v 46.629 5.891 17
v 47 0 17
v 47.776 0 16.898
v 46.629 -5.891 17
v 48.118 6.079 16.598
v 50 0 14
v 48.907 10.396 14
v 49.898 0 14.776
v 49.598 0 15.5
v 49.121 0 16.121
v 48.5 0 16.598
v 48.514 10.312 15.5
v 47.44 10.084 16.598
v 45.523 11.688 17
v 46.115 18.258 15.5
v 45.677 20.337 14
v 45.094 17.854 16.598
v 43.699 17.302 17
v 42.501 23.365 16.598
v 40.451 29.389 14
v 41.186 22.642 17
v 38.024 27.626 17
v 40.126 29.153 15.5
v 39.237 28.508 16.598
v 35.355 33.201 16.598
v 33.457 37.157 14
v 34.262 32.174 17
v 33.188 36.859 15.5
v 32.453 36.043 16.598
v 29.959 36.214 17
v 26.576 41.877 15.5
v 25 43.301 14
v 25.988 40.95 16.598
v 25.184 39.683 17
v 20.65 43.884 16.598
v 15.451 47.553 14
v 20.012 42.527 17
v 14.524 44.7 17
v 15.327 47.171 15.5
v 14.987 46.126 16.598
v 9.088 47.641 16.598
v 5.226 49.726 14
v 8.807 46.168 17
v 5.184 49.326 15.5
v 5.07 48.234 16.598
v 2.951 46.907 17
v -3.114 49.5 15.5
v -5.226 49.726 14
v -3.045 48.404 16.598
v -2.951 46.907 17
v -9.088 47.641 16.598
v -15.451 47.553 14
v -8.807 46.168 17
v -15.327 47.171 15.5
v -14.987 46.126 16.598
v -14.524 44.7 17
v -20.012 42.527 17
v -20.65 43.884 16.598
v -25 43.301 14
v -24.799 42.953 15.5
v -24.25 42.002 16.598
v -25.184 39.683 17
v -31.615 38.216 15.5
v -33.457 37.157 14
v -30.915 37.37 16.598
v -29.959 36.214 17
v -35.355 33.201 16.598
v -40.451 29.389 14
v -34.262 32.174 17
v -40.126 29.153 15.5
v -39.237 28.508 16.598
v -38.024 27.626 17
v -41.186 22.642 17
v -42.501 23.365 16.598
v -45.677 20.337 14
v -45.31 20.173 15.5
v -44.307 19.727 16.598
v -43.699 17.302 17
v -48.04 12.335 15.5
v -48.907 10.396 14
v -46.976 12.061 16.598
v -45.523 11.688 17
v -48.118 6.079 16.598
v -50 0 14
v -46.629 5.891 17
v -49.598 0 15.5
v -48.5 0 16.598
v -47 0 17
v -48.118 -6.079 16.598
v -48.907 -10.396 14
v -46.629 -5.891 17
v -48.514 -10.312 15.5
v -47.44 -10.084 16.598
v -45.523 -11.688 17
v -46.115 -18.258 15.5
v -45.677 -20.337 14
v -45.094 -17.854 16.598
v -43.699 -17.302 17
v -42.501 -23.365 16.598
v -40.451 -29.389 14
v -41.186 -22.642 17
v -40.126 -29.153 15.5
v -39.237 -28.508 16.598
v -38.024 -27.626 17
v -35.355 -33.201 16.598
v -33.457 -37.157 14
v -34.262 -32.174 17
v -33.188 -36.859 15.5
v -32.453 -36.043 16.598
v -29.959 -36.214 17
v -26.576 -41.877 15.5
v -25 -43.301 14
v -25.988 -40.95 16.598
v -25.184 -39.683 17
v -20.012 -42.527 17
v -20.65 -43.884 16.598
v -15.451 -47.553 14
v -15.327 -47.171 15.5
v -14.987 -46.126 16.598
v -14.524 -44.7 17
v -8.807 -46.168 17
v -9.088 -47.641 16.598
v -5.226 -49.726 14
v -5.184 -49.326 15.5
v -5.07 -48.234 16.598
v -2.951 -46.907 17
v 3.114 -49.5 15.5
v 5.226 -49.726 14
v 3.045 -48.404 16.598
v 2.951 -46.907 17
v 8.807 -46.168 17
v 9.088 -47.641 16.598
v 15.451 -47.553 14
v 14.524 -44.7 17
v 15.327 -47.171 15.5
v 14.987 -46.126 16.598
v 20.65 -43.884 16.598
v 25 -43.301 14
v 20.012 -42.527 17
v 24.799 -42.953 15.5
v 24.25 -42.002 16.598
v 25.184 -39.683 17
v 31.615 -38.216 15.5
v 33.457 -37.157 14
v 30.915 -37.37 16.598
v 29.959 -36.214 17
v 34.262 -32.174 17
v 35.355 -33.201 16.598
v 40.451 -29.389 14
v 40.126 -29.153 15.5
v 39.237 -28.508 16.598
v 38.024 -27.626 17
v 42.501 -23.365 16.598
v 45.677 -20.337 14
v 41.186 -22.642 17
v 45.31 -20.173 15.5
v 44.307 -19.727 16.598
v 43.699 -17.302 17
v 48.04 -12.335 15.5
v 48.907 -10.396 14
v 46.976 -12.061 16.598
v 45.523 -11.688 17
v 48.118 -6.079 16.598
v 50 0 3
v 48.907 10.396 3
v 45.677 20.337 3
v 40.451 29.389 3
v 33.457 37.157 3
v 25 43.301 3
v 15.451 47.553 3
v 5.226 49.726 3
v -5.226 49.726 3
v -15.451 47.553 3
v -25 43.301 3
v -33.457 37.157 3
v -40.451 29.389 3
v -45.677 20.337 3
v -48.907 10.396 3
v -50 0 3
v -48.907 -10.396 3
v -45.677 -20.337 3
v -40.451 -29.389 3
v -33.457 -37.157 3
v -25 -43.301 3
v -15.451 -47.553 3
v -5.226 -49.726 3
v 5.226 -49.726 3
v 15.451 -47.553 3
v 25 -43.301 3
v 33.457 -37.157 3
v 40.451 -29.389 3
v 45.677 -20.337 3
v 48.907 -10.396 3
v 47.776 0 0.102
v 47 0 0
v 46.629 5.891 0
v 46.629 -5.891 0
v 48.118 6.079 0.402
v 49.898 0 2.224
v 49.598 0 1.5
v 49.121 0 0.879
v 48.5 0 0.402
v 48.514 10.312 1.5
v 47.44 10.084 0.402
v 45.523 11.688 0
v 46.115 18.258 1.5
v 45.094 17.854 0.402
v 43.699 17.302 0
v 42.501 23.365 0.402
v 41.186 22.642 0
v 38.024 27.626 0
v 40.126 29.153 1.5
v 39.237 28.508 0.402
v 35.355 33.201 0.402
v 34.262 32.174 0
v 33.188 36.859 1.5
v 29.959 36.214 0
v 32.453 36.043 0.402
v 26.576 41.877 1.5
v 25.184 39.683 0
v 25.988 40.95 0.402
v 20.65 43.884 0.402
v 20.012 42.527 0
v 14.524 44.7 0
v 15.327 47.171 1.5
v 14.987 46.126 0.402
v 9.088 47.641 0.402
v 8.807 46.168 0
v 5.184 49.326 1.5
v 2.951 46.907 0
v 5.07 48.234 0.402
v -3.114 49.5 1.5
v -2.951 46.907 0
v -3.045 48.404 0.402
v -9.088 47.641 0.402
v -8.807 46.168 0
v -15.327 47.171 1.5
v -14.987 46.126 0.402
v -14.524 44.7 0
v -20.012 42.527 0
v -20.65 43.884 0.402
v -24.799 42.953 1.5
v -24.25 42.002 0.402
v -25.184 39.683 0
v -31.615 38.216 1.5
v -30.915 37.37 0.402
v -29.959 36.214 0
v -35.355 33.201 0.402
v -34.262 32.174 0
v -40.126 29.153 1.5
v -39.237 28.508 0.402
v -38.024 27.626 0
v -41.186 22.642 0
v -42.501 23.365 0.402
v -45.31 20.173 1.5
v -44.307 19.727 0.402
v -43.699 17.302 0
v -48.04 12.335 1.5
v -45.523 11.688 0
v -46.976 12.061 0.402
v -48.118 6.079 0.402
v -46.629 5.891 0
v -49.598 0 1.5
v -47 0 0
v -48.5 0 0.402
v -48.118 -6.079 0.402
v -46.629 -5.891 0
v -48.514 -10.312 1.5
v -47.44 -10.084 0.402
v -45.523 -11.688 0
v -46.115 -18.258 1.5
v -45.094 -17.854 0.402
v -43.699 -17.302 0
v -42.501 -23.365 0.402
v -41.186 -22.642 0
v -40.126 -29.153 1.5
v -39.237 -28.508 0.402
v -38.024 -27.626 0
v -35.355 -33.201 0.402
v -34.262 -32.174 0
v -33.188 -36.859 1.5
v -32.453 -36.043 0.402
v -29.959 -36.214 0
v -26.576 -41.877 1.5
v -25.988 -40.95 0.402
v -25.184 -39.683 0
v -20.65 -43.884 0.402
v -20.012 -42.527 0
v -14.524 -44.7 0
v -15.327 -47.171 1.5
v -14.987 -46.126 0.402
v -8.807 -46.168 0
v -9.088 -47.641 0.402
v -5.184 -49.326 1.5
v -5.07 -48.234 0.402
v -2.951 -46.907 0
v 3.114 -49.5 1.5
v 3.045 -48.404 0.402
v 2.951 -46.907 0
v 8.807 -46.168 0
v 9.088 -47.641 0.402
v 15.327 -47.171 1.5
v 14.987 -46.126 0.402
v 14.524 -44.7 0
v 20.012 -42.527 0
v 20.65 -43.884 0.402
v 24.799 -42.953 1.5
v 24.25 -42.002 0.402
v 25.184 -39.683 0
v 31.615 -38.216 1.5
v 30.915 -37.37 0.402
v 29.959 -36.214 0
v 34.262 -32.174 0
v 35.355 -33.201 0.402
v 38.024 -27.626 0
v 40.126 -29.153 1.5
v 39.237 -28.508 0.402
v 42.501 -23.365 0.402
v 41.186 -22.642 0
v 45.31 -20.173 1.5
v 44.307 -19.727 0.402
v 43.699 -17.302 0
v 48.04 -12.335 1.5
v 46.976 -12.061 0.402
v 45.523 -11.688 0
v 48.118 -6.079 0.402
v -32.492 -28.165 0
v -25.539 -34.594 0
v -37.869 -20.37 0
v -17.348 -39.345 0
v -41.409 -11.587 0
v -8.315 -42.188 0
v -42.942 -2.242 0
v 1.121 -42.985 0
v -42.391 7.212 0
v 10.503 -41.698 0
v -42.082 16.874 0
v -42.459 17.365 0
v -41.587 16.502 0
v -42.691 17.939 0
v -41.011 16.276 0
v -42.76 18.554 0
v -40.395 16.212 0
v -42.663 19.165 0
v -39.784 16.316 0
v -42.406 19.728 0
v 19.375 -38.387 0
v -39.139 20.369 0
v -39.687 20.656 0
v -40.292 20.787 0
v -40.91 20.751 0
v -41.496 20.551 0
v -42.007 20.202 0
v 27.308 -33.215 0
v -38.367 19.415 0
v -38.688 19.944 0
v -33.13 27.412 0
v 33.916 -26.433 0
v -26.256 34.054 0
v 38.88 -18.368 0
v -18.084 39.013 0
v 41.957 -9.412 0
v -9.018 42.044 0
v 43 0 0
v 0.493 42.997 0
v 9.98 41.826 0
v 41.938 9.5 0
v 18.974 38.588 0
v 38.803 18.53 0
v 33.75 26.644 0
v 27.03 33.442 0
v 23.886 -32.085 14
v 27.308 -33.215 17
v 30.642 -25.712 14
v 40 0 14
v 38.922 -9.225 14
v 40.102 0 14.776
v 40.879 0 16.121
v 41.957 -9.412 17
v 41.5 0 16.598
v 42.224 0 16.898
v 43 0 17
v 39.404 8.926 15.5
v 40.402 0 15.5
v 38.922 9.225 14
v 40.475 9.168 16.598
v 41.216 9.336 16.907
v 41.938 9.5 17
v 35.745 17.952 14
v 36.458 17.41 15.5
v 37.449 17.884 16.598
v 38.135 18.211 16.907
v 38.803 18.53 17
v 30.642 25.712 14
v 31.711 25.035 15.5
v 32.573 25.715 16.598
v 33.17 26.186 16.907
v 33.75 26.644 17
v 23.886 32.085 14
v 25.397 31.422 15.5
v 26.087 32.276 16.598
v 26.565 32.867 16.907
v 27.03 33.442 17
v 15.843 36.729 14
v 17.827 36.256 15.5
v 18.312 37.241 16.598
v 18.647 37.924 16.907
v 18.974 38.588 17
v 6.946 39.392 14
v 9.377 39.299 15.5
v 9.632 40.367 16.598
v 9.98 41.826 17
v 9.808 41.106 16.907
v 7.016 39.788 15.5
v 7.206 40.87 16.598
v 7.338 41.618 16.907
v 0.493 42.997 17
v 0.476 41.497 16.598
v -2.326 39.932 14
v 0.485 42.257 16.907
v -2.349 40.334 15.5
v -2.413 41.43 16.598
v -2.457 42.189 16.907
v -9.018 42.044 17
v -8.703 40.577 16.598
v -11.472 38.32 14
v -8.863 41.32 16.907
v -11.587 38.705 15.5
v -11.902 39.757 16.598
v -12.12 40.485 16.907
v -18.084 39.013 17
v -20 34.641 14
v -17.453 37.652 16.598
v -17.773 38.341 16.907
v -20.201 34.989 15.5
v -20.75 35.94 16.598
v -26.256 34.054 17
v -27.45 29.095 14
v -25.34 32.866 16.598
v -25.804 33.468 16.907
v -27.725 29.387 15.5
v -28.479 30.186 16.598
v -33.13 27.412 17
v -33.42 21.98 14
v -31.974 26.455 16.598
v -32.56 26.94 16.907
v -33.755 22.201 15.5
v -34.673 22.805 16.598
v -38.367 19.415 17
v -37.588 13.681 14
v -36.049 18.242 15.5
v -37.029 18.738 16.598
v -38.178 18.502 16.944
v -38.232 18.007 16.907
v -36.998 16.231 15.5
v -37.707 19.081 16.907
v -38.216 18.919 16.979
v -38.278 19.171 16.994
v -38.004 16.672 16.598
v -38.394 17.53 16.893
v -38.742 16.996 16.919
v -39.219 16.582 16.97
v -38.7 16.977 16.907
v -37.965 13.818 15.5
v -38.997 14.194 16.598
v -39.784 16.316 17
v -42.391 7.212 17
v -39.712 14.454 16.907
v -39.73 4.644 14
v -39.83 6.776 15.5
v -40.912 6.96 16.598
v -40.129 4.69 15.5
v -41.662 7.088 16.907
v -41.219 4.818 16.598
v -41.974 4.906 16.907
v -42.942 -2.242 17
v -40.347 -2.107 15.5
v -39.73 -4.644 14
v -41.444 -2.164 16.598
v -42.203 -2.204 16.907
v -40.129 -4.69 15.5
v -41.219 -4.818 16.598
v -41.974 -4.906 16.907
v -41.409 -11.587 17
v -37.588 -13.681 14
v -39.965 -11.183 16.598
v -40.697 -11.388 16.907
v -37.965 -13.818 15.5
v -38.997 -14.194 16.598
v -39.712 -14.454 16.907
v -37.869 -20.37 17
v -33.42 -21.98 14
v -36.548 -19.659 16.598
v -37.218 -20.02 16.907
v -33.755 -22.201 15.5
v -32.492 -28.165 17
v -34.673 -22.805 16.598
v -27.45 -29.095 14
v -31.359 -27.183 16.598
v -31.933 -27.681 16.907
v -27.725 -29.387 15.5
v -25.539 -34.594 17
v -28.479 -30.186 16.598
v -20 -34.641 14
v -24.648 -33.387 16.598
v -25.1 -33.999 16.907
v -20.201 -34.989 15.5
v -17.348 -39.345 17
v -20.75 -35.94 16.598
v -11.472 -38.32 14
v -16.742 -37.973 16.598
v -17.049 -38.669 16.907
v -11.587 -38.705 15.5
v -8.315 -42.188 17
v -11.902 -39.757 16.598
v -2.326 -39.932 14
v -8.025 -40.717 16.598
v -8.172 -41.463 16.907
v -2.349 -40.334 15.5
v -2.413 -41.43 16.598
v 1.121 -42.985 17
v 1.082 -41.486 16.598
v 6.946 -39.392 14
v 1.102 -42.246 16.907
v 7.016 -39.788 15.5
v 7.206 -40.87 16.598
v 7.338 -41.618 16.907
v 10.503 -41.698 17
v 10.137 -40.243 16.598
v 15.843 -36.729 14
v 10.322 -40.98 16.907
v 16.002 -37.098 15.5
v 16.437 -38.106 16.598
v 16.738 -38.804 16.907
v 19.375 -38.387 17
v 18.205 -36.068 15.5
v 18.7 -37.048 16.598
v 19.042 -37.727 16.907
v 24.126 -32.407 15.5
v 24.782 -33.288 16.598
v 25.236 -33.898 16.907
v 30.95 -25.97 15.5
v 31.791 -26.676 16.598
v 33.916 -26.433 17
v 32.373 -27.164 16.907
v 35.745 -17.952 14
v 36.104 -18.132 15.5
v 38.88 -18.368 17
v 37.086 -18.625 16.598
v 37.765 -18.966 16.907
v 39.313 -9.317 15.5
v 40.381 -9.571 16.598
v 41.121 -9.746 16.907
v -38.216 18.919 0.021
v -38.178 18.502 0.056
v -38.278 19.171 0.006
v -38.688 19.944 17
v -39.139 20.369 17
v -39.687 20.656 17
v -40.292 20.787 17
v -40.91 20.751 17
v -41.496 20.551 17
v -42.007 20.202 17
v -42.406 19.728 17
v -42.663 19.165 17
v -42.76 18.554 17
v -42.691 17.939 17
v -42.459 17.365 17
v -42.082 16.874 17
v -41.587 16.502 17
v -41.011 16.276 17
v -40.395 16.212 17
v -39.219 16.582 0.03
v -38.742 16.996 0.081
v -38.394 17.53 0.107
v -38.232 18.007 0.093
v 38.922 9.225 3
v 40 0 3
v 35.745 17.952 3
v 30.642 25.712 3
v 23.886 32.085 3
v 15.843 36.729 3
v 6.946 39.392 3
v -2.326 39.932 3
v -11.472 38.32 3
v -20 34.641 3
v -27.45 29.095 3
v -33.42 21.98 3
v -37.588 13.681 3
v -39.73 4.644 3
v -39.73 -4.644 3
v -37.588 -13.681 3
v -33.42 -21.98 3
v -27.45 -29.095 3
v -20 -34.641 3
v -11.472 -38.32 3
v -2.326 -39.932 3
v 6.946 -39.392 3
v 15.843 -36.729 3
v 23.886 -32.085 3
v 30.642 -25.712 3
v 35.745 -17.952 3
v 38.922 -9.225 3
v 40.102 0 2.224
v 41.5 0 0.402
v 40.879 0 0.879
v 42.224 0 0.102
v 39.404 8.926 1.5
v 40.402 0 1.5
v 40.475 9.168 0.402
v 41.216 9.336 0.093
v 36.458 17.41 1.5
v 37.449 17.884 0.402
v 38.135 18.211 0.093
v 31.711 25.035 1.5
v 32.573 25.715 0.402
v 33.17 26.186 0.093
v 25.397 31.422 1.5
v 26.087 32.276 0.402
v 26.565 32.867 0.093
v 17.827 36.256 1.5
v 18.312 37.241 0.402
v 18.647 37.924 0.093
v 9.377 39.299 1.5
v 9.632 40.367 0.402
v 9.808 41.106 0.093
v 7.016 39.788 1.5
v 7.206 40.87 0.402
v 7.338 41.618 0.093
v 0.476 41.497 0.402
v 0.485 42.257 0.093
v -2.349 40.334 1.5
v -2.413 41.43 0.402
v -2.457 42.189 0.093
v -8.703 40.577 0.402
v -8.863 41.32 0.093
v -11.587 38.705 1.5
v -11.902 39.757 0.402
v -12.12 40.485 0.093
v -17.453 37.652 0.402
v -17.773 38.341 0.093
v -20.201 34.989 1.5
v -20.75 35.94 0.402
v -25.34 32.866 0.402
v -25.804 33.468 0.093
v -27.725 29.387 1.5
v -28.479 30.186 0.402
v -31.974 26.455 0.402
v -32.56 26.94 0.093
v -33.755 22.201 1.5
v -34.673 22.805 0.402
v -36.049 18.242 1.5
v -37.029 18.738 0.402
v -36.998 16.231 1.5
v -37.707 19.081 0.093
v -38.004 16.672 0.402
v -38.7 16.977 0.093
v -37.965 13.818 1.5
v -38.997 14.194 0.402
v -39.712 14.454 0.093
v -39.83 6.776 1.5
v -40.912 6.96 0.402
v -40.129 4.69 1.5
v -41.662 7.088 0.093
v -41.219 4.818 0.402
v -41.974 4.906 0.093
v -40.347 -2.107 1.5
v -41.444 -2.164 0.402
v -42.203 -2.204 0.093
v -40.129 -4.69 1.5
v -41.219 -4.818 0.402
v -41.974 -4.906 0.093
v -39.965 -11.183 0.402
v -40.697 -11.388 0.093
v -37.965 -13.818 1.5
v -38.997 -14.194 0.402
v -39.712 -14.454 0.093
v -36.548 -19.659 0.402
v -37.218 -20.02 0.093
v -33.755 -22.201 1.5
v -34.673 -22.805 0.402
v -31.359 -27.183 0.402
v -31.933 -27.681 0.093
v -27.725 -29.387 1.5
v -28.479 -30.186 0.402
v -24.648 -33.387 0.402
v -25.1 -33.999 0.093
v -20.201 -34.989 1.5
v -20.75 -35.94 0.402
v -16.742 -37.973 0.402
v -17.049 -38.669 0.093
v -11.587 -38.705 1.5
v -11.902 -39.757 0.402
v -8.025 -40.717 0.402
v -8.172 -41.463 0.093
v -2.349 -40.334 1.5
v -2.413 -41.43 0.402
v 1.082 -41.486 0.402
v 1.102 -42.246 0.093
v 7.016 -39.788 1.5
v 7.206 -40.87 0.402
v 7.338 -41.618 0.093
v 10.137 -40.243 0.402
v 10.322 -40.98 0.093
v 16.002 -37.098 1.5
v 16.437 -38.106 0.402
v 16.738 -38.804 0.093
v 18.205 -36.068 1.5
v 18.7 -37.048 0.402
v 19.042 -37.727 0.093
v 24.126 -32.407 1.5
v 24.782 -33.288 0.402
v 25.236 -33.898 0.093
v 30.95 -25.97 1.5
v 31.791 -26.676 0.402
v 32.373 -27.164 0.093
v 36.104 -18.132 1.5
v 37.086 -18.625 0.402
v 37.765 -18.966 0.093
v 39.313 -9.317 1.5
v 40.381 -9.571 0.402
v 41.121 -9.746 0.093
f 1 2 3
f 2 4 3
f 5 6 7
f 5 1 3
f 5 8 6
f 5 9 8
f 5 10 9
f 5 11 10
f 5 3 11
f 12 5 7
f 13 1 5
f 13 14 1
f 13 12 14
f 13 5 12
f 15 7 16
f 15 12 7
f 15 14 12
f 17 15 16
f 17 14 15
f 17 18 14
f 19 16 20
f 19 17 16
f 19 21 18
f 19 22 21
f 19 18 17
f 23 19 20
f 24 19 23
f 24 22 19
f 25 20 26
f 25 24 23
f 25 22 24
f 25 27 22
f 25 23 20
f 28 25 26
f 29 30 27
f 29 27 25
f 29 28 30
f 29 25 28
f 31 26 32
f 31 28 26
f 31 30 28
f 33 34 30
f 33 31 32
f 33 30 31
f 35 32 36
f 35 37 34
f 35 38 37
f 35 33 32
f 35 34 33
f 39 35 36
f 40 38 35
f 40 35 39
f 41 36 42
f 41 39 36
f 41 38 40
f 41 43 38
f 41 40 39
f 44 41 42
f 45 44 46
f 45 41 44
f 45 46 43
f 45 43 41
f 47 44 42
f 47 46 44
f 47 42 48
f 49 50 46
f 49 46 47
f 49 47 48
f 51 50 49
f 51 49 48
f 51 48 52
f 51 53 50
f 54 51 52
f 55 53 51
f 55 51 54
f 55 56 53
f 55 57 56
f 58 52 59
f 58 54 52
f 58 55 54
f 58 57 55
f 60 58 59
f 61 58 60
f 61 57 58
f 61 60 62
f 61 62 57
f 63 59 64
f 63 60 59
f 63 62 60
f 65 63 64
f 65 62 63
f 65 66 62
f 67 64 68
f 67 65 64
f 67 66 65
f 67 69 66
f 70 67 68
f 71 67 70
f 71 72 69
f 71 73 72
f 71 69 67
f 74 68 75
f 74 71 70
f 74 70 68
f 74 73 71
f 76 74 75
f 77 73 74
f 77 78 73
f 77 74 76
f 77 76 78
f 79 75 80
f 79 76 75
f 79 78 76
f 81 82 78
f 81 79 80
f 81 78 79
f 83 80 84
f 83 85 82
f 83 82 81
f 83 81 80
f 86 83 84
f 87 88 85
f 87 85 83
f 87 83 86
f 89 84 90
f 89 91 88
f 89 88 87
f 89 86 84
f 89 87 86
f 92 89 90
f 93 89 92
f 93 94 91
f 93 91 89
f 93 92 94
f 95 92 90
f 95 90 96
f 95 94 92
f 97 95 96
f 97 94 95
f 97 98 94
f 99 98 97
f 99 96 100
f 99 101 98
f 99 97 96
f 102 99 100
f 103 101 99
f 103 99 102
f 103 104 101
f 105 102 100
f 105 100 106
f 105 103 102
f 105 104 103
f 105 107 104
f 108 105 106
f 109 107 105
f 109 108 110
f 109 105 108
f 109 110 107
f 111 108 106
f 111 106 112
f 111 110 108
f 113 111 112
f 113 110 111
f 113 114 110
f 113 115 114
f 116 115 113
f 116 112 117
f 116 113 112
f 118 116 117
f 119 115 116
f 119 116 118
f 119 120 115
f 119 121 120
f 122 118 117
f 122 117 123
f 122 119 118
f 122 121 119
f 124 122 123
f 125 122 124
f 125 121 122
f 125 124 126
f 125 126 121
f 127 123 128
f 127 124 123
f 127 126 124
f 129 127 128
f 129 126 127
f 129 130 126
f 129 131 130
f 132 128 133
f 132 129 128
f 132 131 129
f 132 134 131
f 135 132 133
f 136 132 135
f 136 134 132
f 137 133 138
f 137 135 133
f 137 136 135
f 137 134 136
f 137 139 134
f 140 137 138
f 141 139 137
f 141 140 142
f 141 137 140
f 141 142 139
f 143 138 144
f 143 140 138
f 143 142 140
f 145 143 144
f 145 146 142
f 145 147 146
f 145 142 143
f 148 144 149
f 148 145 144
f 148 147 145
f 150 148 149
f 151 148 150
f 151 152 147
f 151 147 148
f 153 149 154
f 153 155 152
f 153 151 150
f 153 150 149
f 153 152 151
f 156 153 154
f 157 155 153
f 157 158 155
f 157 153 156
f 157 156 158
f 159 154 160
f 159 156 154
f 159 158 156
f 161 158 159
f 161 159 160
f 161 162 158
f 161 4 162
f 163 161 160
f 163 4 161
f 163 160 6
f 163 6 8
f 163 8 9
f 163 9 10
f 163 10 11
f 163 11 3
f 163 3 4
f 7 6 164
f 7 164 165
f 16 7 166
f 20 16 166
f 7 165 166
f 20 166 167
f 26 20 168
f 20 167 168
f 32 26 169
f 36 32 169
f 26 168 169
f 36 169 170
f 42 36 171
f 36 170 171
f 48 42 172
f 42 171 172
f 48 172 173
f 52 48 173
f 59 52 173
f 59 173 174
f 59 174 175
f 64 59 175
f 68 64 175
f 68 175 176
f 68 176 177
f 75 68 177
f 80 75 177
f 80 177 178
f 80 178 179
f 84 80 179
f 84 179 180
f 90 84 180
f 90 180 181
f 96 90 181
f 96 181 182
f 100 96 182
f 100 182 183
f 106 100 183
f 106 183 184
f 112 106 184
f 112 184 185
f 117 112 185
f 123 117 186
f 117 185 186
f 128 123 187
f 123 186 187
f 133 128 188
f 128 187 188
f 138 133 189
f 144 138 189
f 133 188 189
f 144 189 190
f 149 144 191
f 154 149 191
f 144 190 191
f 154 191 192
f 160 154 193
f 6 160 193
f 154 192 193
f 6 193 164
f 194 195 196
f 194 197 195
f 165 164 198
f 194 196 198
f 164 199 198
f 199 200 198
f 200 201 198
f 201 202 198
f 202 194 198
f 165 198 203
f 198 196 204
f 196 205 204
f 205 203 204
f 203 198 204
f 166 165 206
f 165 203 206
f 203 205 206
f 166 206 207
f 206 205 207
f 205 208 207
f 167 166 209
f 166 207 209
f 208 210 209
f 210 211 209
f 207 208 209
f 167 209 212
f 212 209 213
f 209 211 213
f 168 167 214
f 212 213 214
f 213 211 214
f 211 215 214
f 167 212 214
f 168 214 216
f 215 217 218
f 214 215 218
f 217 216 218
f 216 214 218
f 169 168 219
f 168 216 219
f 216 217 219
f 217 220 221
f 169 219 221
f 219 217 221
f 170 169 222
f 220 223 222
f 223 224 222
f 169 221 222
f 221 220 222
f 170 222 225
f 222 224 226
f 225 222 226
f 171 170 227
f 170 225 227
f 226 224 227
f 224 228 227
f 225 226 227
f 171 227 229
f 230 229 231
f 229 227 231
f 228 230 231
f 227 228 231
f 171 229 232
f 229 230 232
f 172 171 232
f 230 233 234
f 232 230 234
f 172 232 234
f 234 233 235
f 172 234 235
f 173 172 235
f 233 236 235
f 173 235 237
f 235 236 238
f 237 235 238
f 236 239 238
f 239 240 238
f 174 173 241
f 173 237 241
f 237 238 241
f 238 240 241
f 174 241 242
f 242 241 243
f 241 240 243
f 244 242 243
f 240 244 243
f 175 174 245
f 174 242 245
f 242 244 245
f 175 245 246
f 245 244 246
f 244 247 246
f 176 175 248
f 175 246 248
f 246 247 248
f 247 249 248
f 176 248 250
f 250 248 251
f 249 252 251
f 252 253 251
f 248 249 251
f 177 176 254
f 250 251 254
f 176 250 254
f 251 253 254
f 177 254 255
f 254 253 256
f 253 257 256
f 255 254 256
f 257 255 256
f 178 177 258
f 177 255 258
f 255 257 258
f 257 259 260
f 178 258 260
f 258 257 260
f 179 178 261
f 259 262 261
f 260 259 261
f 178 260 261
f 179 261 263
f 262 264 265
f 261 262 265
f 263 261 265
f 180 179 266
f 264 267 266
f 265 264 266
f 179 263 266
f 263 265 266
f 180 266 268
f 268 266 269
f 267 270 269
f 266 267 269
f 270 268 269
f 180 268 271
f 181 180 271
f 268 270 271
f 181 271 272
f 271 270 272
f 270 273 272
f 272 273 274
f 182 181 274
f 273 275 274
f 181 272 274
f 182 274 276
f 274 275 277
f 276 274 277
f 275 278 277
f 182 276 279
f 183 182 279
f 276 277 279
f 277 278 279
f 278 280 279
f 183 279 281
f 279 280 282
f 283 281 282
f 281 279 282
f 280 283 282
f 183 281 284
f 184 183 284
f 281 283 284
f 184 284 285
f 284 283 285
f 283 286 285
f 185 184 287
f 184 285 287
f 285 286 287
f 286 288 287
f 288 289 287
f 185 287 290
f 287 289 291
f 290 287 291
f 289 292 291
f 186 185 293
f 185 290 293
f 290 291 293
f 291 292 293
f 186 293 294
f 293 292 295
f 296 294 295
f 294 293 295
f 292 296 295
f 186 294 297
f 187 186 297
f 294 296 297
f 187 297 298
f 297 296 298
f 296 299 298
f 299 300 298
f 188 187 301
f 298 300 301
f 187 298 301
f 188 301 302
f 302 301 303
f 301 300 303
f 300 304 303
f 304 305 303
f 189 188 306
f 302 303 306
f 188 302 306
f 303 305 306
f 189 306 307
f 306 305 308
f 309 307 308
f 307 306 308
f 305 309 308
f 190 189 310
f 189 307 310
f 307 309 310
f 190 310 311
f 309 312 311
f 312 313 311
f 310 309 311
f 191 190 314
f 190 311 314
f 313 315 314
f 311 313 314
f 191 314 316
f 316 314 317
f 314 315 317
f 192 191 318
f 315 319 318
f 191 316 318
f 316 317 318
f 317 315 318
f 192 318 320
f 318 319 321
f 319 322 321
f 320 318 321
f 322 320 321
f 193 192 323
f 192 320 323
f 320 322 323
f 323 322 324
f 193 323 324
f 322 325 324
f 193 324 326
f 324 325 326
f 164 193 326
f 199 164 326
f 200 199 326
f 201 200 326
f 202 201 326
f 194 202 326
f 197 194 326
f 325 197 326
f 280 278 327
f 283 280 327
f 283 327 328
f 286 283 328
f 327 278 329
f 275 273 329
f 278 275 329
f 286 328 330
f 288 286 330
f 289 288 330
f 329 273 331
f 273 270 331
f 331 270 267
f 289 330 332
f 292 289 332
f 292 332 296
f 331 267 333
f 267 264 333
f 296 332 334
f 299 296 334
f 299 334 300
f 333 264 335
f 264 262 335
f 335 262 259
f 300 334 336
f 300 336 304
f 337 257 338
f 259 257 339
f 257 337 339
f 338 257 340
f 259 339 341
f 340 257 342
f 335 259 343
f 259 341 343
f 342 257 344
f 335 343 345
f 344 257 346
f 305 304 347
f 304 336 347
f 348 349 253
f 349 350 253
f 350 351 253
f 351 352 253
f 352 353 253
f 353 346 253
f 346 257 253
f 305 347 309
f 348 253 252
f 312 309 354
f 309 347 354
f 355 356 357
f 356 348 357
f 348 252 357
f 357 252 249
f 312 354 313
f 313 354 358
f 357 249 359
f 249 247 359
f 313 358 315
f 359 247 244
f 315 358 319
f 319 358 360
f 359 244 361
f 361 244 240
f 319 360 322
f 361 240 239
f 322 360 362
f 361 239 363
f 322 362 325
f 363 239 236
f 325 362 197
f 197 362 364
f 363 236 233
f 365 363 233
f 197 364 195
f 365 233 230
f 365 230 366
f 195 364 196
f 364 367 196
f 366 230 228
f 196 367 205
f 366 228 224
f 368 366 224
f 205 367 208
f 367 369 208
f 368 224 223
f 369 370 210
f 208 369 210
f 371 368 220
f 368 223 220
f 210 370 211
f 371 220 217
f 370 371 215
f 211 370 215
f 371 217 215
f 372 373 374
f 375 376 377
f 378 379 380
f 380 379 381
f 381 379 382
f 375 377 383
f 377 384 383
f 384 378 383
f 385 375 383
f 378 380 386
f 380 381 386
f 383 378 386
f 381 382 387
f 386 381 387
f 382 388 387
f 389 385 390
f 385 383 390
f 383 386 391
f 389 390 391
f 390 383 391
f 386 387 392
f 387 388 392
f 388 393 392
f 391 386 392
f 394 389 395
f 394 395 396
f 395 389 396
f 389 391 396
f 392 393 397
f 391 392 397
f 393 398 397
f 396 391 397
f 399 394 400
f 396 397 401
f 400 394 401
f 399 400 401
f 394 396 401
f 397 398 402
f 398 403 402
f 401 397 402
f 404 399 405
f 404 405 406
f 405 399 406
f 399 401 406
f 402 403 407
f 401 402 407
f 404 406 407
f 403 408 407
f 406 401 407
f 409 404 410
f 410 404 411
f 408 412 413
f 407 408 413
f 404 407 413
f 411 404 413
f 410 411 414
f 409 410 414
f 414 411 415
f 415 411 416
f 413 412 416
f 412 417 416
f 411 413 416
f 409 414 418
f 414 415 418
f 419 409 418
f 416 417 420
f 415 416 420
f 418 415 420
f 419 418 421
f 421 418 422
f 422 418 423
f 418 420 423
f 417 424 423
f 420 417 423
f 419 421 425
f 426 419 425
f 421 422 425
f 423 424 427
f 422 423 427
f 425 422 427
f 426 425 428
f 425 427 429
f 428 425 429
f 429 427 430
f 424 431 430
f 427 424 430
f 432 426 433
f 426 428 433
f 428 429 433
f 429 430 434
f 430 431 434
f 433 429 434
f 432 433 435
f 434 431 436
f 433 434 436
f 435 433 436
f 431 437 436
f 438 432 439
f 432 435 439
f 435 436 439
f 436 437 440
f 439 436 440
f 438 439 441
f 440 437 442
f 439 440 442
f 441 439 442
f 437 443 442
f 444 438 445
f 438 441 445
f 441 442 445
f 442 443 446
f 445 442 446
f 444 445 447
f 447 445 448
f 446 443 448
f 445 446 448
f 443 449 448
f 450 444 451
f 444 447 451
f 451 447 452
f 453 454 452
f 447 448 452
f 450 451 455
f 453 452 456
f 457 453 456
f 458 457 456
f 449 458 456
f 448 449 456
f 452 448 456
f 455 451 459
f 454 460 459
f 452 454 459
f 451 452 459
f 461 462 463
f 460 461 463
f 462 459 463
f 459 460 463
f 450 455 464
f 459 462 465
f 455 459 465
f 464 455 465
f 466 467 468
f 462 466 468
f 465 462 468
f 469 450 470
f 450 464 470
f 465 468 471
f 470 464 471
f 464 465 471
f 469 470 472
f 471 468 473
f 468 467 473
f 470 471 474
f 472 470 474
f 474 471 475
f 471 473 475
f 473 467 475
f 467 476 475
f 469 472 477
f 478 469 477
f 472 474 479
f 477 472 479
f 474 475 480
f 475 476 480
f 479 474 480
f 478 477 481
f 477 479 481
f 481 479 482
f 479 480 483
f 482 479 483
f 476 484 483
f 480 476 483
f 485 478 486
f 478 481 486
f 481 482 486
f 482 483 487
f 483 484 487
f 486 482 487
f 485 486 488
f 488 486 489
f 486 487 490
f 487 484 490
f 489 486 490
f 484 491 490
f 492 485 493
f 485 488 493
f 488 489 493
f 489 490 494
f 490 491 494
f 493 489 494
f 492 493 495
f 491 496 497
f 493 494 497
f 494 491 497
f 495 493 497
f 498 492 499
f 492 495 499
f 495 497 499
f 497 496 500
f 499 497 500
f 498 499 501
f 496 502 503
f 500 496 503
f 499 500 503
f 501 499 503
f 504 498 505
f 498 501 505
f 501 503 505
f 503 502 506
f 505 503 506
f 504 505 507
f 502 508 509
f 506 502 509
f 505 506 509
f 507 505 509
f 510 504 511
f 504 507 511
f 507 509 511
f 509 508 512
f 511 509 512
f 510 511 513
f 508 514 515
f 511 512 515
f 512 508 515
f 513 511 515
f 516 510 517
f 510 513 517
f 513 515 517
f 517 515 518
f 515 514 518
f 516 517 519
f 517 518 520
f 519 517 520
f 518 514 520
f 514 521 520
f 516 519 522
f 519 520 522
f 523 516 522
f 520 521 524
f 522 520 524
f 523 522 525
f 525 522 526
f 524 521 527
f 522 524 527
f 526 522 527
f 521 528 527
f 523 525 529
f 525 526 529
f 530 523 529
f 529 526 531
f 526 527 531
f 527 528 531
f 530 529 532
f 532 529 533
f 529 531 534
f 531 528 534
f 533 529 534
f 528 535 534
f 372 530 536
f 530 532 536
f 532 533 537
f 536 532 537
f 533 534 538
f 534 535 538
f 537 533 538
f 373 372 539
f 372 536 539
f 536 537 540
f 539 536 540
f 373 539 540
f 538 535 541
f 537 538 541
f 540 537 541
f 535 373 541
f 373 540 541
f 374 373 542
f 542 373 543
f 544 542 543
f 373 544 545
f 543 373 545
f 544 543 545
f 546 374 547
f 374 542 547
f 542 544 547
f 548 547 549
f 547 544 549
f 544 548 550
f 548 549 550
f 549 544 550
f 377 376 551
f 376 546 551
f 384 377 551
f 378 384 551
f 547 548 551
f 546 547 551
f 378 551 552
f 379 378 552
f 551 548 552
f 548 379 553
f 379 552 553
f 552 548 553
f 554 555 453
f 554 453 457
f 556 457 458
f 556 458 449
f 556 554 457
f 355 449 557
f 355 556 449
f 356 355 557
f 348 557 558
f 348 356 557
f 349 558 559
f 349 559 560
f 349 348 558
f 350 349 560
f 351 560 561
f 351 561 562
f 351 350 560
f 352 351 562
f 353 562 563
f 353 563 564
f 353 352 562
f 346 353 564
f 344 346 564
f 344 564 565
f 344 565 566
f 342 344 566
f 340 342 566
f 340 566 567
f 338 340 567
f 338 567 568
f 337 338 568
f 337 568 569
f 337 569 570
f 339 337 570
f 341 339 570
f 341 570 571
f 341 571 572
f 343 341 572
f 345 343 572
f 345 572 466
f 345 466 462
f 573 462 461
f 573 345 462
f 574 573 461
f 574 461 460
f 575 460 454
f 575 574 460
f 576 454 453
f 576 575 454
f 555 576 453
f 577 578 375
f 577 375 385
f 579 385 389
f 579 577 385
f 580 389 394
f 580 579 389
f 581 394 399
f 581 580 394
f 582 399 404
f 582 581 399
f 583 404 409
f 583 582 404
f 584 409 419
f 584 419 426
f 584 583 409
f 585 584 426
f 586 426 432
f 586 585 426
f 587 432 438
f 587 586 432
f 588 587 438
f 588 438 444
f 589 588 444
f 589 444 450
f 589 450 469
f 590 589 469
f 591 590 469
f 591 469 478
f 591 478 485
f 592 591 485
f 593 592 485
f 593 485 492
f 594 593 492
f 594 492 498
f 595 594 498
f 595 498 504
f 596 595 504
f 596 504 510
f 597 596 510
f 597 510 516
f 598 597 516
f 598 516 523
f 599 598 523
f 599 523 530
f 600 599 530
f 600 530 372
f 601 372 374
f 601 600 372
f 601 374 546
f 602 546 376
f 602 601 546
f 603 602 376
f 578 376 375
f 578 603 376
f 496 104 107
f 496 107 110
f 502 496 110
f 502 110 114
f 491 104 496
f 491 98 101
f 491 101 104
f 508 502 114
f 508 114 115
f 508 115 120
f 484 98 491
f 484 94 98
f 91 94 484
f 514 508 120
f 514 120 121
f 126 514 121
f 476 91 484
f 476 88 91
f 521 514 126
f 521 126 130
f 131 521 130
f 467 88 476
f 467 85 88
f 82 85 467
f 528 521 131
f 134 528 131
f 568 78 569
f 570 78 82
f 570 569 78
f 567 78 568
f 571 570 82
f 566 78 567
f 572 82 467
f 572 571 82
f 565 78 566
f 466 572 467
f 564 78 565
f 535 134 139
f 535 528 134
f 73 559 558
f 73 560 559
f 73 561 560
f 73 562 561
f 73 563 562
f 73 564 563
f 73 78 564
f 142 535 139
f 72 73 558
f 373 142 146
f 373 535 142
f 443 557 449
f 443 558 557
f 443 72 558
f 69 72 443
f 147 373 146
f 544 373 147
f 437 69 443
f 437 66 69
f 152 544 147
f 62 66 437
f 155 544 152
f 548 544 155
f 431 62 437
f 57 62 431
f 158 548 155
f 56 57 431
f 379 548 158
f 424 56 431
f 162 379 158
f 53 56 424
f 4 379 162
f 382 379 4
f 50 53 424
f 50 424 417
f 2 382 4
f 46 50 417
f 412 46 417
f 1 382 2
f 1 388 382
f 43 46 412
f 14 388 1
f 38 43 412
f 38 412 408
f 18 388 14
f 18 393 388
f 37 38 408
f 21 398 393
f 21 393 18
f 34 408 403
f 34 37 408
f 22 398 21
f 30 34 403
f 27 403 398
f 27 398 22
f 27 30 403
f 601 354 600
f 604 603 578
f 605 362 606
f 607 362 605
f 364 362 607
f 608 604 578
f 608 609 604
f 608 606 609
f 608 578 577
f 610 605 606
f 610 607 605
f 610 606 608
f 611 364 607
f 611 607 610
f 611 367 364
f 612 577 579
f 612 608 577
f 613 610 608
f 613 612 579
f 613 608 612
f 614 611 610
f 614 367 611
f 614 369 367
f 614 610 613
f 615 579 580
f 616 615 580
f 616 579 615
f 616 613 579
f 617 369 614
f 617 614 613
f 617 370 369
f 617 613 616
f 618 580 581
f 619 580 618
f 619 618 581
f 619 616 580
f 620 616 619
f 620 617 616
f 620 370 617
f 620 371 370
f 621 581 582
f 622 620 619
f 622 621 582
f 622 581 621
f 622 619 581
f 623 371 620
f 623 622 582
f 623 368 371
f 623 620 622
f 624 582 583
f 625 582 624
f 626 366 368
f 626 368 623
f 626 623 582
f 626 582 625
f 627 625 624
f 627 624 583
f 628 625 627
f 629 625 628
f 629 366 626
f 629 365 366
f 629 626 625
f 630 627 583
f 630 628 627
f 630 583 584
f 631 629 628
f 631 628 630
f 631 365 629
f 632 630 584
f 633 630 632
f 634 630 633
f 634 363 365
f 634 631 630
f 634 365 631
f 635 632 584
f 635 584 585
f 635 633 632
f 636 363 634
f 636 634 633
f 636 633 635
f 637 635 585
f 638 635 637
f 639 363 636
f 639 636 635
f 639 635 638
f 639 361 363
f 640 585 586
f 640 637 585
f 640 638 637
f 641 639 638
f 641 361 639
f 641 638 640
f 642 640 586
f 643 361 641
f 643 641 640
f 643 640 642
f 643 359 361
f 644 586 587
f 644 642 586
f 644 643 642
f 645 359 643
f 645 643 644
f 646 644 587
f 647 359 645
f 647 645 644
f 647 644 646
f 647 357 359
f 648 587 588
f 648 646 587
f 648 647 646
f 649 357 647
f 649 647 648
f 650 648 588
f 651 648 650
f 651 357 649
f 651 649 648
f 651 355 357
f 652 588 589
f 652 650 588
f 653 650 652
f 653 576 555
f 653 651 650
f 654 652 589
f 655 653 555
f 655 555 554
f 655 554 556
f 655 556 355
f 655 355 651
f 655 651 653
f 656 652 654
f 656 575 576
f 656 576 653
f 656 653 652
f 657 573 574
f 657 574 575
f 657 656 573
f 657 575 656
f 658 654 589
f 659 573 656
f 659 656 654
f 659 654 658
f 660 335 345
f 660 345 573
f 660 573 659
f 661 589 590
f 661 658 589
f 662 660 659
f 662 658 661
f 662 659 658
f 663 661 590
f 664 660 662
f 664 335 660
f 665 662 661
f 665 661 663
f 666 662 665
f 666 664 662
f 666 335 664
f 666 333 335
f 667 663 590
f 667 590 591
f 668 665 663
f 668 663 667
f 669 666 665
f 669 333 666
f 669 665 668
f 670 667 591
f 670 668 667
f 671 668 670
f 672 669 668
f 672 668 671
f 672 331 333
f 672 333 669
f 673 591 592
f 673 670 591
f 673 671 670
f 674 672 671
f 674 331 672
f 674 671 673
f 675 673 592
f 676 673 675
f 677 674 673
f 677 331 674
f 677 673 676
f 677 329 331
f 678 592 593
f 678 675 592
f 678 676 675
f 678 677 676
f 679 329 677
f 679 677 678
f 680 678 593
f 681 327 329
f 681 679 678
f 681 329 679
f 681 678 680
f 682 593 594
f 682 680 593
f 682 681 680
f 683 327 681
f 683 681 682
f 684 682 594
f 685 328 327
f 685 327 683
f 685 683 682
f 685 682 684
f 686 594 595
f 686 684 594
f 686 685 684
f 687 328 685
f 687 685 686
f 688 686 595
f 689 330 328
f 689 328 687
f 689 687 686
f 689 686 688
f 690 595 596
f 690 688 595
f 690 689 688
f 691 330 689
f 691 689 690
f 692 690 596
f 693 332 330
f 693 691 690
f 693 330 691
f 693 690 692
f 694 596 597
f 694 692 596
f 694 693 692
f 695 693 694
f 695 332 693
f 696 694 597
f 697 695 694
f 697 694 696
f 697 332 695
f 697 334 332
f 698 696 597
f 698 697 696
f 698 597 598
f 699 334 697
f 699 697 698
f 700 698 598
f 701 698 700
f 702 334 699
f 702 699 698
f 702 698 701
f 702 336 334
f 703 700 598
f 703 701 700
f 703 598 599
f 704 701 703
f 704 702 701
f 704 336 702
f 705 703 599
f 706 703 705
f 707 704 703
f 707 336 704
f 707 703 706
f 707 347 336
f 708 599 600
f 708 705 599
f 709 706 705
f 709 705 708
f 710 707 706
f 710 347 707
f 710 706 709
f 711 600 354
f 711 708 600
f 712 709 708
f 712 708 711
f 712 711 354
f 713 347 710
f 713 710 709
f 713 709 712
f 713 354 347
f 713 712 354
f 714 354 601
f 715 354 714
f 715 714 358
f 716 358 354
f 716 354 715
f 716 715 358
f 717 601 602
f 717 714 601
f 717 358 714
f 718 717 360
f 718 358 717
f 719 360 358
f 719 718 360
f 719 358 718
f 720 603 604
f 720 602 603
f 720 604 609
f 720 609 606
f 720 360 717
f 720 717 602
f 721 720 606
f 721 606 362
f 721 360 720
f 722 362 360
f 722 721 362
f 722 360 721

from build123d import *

# Parameters (mm, degrees)
F0_R     = 50
F0_R_2   = 2.2916267838
F0_R_3   = 40
F1_DEPTH = 17


# Not quite as in the source:
# - a fillet or chamfer that OpenCascade refuses, or shapes differently, is made with other operations: its cross-section is extruded or revolved along the edge and cut away or added


with BuildPart() as f1:
    # F0 (on Top) → F1 (new body)
    with BuildSketch(Plane.XY):
        Circle(F0_R)
        with Locations((-40.46940431, 18.5024235398)):
            Circle(F0_R_2, mode=Mode.SUBTRACT)
        Circle(F0_R_3, mode=Mode.SUBTRACT)
    extrude(amount=F1_DEPTH)

    # F2: fillet of radius 3 on 5 edges, made by hand

    # F2_s1 → F2_t2 (revolve, cut)
    with BuildSketch(Plane.XZ):
        with BuildLine():
            ThreePointArc((50, 3), (49.1213203436, 0.8786796564), (47, 0))
            Line((47, 0), (50, 0))
            Line((50, 0), (50, 3))
        make_face()
    revolve(axis=Axis((0, 0, 0), (0, 0, 1)), mode=Mode.SUBTRACT)

    # F2_s3 → F2_t4 (revolve, cut)
    with BuildSketch(Plane.XZ):
        with BuildLine():
            ThreePointArc((50, 14), (49.1213203436, 16.1213203436), (47, 17))
            Line((47, 17), (50, 17))
            Line((50, 17), (50, 14))
        make_face()
    revolve(axis=Axis((0, 0, 17), (0, 0, 1)), mode=Mode.SUBTRACT)

    # F2_s5 → F2_t6 (revolve, cut)
    with BuildSketch(Plane.XZ):
        with BuildLine():
            ThreePointArc((40, 14), (40.8786796564, 16.1213203436), (43, 17))
            Line((43, 17), (40, 17))
            Line((40, 17), (40, 14))
        make_face()
    revolve(axis=Axis((0, 0, 17), (0, 0, 1)), mode=Mode.SUBTRACT)

    # F2_s7 → F2_t8 (revolve, cut)
    with BuildSketch(Plane.XZ):
        with BuildLine():
            ThreePointArc((40, 3), (40.8786796564, 0.8786796564), (43, 0))
            Line((43, 0), (40, 0))
            Line((40, 0), (40, 3))
        make_face()
    revolve(axis=Axis((0, 0, 0), (0, 0, 1)), mode=Mode.SUBTRACT)


solid = f1.part
